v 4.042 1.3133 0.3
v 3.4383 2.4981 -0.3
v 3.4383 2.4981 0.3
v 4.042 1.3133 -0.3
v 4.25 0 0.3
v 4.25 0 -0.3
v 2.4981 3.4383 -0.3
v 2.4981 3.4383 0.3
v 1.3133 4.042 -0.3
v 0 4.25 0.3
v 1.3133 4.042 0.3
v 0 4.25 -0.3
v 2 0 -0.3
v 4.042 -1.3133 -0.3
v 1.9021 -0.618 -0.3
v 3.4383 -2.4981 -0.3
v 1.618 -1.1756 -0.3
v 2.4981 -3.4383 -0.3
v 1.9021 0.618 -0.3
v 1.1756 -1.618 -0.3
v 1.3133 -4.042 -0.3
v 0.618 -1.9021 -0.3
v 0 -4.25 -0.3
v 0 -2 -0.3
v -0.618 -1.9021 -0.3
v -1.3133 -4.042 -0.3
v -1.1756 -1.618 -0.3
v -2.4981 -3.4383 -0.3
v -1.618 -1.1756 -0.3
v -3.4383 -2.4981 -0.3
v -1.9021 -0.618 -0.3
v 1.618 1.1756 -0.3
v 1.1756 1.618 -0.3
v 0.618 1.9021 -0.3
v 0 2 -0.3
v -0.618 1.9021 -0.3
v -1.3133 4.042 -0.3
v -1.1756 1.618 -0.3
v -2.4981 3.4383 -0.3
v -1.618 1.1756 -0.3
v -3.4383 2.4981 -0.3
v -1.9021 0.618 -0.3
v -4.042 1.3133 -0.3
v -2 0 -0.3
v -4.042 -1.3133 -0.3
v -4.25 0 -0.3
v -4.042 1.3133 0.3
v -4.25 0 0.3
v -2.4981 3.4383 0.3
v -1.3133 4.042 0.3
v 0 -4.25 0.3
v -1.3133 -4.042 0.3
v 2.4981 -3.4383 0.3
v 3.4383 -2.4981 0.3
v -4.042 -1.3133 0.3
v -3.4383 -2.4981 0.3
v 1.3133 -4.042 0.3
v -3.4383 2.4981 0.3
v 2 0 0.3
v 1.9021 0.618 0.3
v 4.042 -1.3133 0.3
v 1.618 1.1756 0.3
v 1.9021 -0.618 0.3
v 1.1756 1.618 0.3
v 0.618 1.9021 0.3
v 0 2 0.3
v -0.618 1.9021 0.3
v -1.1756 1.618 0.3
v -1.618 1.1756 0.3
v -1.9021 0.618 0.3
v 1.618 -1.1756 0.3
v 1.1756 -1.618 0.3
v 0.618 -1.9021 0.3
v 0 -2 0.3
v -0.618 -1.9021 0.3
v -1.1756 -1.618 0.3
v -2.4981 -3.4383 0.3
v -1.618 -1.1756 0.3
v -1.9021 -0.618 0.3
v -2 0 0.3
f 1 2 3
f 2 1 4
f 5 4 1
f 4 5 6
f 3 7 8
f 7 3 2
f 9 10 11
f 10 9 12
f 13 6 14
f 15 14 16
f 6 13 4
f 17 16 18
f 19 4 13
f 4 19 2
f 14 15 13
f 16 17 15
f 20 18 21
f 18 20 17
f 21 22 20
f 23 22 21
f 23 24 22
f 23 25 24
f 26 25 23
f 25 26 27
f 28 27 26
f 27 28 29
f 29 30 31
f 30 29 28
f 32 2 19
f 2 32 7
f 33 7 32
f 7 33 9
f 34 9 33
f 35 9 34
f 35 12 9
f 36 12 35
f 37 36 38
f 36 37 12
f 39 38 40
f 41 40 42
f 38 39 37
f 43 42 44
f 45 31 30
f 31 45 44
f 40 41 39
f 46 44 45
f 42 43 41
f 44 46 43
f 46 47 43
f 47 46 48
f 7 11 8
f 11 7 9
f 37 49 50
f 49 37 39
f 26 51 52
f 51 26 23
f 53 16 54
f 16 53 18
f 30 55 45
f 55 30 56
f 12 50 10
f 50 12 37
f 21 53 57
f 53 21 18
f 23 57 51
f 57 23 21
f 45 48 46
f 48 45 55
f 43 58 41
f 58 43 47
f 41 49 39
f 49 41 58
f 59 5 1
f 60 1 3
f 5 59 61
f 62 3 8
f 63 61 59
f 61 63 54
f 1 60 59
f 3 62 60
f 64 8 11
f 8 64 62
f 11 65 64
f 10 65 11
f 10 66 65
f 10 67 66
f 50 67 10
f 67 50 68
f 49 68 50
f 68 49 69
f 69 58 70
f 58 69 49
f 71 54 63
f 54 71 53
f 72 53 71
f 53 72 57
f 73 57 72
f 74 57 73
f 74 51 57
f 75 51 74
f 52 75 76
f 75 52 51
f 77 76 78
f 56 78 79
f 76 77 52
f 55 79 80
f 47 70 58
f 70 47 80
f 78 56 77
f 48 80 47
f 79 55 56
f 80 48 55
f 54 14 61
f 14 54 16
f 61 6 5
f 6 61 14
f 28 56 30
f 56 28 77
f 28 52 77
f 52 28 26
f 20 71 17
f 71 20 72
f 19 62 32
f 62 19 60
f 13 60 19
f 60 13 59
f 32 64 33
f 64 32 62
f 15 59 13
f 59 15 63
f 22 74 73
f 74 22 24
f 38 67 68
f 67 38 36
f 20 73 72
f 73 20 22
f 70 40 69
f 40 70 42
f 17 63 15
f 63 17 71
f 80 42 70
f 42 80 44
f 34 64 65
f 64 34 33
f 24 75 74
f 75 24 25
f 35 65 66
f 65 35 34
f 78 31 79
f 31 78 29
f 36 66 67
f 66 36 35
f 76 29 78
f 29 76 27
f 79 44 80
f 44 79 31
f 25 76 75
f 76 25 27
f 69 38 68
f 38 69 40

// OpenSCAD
drill = 4;
diam_ext=8.5;


difference() {
  cylinder(r=diam_ext/2, h=0.6, center=true, $fn=20);
  cylinder(r=drill/2, h=15, center=true, $fn=20);
}
